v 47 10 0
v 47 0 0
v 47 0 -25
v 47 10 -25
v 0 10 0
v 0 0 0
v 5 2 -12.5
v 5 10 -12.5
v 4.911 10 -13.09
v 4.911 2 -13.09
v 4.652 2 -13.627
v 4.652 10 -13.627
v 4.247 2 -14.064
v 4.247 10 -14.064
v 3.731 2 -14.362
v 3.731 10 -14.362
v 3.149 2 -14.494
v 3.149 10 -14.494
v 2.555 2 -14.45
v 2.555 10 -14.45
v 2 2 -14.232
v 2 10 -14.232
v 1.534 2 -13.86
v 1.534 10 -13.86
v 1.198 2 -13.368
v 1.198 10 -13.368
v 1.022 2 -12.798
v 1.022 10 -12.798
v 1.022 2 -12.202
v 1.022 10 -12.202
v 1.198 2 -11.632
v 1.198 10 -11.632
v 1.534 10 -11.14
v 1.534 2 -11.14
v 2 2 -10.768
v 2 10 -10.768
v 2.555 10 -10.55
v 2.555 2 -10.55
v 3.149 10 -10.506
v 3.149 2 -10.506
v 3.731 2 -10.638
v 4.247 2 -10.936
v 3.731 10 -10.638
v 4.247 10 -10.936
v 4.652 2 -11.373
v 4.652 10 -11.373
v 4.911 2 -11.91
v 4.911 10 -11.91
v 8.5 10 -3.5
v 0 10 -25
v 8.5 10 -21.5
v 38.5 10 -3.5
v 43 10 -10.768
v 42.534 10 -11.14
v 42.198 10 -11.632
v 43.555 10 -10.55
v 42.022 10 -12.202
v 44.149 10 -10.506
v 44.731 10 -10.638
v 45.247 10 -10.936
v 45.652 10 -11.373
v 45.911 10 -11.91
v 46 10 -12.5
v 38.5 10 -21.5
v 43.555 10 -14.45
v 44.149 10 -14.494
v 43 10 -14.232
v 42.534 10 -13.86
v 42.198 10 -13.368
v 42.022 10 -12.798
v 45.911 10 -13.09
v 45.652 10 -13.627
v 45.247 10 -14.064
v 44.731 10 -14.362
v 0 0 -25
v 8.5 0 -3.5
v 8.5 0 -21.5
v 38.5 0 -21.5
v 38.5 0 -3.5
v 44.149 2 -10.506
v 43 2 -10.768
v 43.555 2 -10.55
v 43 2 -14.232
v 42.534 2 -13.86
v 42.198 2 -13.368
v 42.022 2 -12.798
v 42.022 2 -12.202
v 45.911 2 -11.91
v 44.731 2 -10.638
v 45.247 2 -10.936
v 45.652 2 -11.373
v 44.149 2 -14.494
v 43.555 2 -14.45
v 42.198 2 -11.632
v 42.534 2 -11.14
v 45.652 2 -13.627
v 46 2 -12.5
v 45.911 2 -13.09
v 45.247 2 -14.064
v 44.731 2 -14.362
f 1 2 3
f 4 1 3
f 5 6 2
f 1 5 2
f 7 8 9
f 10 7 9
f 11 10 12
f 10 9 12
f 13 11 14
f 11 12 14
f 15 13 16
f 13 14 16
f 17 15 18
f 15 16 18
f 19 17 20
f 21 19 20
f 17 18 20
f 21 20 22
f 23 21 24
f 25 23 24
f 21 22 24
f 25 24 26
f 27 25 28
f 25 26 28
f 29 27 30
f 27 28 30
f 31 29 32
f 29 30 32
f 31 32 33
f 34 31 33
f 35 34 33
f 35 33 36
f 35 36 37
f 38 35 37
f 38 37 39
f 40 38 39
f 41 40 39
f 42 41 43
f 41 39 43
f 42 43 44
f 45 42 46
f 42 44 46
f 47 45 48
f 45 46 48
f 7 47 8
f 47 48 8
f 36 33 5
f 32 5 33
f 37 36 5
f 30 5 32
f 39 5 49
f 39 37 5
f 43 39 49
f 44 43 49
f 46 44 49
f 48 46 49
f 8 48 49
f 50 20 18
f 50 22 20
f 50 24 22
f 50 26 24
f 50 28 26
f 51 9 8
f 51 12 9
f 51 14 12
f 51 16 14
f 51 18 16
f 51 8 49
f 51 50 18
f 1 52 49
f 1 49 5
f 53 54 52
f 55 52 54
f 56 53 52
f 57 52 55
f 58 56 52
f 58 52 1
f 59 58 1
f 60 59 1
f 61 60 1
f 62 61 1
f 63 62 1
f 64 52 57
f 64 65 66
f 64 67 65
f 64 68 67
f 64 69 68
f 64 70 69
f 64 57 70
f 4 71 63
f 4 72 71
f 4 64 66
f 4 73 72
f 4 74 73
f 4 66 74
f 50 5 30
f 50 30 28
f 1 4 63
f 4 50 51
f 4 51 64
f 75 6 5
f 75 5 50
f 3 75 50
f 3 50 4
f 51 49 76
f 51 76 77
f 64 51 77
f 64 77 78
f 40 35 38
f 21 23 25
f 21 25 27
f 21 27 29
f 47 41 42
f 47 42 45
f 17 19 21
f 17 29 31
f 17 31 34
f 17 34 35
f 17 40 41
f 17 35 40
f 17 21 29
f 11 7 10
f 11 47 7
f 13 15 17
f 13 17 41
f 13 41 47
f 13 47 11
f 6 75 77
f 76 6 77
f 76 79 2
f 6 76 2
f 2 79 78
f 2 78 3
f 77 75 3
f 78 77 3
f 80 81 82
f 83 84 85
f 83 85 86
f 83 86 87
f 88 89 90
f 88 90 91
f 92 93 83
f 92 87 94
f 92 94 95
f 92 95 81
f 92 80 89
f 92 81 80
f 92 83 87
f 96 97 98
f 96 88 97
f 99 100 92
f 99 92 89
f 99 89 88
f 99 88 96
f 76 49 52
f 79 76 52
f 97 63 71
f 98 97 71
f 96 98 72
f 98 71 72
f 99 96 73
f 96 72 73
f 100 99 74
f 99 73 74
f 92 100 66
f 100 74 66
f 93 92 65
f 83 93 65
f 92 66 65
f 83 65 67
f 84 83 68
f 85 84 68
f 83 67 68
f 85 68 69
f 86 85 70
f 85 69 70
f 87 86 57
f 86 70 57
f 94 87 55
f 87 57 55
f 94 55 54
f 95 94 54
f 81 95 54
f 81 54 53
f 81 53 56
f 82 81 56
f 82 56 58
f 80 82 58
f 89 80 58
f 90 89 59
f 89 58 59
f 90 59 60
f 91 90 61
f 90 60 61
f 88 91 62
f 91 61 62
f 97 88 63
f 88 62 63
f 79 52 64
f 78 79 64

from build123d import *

# Parameters (mm, degrees)
SKETCH1_W           = 47
SKETCH1_H           = 25
BOSS_EXTRUDE1_DEPTH = 10
SKETCH2_R           = 2
CUT_EXTRUDE1_DEPTH  = 8
SKETCH5_W           = 30
SKETCH5_H           = 18
CUT_EXTRUDE2_DEPTH  = 10


with BuildPart() as part:
    # Sketch1 → Boss-Extrude1 (new body)
    with BuildSketch(Plane(origin=(0, 0, 0), x_dir=(1, 0, 0), z_dir=(0, 1, 0))):
        with Locations((23.5, 12.5)):
            Rectangle(SKETCH1_W, SKETCH1_H)
    extrude(amount=BOSS_EXTRUDE1_DEPTH)

    # Sketch2 → Cut-Extrude1 (cut)
    with BuildSketch(Plane(origin=(0, 10, 0), x_dir=(1, 0, 0), z_dir=(0, 1, 0))):
        with Locations((3, 12.5)):
            Circle(SKETCH2_R)
        with Locations((44, 12.5)):
            Circle(SKETCH2_R)
    extrude(amount=-CUT_EXTRUDE1_DEPTH, mode=Mode.SUBTRACT)

    # Sketch5 → Cut-Extrude2 (cut)
    with BuildSketch(Plane(origin=(0, 10, 0), x_dir=(1, 0, 0), z_dir=(0, 1, 0))):
        with Locations((23.5, 12.5)):
            Rectangle(SKETCH5_W, SKETCH5_H)
    extrude(amount=-CUT_EXTRUDE2_DEPTH, mode=Mode.SUBTRACT)


solid = part.part
